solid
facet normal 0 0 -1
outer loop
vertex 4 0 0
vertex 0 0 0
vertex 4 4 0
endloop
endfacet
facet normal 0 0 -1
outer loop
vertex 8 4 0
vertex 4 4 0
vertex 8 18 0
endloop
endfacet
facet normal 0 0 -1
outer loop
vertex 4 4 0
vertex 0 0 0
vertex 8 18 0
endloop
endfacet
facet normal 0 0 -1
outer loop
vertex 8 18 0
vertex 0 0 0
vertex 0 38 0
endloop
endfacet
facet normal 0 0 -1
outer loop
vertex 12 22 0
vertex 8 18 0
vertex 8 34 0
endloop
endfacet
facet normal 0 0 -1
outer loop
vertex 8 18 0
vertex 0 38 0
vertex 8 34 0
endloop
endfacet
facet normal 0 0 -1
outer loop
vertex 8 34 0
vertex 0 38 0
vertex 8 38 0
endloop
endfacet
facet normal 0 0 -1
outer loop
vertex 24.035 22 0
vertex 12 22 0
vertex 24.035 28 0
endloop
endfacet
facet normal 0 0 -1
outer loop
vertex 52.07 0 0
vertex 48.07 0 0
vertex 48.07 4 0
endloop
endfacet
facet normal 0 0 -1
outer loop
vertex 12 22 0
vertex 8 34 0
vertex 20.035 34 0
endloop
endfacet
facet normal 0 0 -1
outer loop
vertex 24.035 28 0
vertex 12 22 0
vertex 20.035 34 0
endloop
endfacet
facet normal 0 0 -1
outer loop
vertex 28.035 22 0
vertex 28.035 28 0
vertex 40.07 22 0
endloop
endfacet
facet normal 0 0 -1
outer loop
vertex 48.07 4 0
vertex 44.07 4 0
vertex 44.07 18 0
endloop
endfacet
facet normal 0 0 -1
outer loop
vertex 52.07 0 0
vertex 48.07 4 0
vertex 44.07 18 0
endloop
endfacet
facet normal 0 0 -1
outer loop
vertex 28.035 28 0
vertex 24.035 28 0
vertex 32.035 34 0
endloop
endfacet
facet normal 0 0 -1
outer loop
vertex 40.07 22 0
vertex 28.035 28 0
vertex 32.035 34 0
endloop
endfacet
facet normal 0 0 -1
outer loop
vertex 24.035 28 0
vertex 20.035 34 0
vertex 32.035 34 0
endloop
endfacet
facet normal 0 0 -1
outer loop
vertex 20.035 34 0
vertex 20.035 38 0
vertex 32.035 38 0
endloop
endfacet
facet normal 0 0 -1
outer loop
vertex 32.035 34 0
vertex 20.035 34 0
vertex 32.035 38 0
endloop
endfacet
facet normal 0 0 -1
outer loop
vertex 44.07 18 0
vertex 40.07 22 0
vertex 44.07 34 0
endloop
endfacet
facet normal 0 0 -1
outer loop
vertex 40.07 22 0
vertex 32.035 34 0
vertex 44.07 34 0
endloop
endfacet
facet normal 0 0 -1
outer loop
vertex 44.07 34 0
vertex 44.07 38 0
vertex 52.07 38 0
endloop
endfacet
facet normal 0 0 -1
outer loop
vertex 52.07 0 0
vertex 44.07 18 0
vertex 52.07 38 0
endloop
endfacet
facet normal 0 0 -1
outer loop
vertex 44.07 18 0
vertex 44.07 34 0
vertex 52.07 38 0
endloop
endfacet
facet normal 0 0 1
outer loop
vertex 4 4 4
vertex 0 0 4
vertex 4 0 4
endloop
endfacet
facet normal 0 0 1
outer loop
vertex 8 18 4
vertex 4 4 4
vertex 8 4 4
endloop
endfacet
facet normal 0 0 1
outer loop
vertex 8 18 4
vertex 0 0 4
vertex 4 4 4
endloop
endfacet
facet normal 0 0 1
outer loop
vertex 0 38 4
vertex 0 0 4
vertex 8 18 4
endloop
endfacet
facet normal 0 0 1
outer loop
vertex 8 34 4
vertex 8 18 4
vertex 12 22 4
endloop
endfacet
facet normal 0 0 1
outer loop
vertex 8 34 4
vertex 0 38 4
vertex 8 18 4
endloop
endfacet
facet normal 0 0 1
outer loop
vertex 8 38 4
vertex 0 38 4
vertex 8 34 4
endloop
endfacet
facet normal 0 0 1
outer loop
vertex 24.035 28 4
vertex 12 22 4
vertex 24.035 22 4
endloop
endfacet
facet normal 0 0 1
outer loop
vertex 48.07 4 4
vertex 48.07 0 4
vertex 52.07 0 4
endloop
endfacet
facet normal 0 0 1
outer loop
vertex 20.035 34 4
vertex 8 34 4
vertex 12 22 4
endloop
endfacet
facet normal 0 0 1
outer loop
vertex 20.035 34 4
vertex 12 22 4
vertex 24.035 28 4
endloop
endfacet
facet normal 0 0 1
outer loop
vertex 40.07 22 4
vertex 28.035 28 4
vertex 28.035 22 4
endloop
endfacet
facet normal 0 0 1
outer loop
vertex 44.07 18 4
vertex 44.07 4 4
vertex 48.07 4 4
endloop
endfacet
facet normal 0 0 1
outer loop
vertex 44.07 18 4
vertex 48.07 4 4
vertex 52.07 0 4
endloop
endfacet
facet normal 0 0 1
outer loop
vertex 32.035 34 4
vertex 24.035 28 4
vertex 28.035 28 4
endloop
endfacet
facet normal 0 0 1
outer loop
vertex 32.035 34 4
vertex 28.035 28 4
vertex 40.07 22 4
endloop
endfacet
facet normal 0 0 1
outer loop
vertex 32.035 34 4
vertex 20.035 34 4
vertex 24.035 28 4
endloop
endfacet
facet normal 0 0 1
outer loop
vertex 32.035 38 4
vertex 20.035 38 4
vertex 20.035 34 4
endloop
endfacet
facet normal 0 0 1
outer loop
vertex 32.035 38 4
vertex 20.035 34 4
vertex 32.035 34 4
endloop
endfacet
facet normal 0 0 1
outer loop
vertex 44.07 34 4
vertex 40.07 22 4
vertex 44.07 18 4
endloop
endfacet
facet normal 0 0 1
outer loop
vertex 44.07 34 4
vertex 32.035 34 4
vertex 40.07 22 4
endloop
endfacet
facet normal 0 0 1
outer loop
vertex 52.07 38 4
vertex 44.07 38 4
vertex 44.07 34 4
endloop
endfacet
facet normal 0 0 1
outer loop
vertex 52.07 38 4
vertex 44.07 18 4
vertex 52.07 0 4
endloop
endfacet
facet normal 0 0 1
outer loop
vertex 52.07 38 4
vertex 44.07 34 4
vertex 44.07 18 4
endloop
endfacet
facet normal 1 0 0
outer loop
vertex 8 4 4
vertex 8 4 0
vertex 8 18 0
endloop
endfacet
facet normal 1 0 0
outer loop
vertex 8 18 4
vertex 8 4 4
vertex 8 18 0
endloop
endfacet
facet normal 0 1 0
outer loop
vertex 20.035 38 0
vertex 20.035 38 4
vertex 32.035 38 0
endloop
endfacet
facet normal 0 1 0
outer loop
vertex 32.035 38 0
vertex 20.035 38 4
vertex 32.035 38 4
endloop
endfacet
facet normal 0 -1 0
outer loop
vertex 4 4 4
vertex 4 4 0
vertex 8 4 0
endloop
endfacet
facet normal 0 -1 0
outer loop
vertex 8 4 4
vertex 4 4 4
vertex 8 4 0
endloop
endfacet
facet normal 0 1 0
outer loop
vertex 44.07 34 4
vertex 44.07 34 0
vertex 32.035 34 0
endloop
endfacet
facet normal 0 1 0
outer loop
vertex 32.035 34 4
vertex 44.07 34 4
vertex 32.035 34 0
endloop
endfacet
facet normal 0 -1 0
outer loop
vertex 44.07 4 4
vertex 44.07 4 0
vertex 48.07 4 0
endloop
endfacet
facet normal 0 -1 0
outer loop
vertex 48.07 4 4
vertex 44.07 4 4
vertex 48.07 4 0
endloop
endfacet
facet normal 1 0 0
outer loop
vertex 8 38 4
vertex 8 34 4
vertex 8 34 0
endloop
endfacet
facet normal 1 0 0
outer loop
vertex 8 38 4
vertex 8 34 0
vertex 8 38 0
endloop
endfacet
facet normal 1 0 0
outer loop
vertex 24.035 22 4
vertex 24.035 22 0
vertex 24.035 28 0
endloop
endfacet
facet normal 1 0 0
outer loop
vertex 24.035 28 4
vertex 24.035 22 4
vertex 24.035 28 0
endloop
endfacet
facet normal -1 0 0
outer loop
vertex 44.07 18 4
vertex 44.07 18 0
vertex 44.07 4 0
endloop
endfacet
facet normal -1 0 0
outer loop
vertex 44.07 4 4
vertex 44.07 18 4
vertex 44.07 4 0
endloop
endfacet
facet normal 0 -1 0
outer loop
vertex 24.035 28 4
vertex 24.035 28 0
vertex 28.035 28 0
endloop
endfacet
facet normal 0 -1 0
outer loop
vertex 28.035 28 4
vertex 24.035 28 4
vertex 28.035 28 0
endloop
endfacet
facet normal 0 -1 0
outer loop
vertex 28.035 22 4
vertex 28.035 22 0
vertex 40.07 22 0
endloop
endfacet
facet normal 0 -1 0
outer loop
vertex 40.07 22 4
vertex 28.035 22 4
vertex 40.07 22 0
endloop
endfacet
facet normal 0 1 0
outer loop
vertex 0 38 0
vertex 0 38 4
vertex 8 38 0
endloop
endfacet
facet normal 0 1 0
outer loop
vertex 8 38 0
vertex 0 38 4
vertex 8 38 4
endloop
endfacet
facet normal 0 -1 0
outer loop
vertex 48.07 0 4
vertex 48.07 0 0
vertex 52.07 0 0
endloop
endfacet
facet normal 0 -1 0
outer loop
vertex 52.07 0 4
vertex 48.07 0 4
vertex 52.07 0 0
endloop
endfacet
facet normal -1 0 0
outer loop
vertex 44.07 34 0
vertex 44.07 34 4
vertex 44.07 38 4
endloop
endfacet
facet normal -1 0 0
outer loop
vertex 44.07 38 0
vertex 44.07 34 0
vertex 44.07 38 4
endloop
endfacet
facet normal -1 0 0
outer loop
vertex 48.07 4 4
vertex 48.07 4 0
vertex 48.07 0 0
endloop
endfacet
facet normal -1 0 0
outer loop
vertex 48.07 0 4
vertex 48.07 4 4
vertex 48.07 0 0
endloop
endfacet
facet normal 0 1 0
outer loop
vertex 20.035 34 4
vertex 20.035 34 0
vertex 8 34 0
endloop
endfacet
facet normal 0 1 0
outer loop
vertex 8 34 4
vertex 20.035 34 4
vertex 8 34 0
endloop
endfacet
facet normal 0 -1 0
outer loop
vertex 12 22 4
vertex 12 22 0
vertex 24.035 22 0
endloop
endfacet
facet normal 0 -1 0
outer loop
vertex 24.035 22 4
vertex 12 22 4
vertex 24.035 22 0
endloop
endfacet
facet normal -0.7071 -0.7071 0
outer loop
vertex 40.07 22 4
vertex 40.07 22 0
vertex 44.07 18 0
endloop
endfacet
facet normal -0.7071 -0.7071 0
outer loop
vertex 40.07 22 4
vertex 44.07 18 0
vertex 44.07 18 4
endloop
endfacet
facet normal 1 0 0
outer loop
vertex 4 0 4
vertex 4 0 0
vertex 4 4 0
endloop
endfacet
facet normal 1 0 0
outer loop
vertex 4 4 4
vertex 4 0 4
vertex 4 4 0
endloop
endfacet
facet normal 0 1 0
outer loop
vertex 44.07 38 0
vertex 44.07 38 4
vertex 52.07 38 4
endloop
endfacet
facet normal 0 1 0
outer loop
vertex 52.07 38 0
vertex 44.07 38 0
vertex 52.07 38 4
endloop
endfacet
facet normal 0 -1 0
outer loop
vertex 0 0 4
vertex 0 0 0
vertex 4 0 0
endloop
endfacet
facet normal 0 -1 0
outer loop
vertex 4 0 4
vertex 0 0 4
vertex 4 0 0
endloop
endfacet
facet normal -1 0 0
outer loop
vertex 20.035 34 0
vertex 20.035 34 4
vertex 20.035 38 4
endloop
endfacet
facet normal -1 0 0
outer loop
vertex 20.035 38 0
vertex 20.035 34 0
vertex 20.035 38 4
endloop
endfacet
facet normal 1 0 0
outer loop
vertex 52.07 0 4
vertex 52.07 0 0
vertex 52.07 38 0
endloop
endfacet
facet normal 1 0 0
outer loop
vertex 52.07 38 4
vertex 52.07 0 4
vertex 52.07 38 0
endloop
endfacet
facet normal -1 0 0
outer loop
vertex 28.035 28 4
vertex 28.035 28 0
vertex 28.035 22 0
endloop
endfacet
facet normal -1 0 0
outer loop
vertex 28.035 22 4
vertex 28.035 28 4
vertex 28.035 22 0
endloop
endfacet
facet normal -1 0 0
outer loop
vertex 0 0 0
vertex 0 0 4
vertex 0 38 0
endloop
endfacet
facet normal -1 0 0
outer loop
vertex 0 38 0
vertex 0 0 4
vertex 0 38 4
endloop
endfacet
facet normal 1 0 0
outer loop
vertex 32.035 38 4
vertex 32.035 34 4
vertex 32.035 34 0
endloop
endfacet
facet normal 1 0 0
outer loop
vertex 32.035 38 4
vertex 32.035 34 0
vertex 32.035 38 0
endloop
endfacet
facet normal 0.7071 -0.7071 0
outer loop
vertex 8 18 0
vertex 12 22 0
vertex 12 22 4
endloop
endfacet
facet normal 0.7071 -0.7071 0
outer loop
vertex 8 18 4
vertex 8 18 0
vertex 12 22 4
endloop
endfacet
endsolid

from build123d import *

# Parameters (mm, degrees)
BOSS_EXTRUDE1_DEPTH = 4
CHAMFER1_SIZE       = 4
SKETCH2_W           = 8
SKETCH2_H           = 4
SKETCH2_W_2         = 12
BOSS_EXTRUDE2_DEPTH = 4


with BuildPart() as part:
    # Sketch1 → Boss-Extrude1 (new body)
    with BuildSketch(Plane.XY):
        Polygon((0, 34), (0, 0), (4, 0), (4, 4), (8, 4), (8, 22), (24.035, 22), (24.035, 28), (26.035, 28), (26.035, 34), align=None)
        Polygon((52.07, 34), (26.035, 34), (26.035, 28), (28.035, 28), (28.035, 22), (44.07, 22), (44.07, 4), (48.07, 4), (48.07, 0), (52.07, 0), align=None)
    extrude(amount=BOSS_EXTRUDE1_DEPTH)

    # Chamfer1
    chamfer1_edges = [part.edges().sort_by_distance(p)[0] for p in [
        (44.07, 22, 2),
        (8, 22, 2),
    ]]
    chamfer(chamfer1_edges, length=CHAMFER1_SIZE)

    # Sketch2 → Boss-Extrude2 (add)
    with BuildSketch(Plane.XY.offset(4)):
        with Locations((4, 36)):
            Rectangle(SKETCH2_W, SKETCH2_H)
        with Locations((48.07, 36)):
            Rectangle(SKETCH2_W, SKETCH2_H)
        with Locations((26.035, 36)):
            Rectangle(SKETCH2_W_2, SKETCH2_H)
    extrude(amount=-BOSS_EXTRUDE2_DEPTH)


solid = part.part
